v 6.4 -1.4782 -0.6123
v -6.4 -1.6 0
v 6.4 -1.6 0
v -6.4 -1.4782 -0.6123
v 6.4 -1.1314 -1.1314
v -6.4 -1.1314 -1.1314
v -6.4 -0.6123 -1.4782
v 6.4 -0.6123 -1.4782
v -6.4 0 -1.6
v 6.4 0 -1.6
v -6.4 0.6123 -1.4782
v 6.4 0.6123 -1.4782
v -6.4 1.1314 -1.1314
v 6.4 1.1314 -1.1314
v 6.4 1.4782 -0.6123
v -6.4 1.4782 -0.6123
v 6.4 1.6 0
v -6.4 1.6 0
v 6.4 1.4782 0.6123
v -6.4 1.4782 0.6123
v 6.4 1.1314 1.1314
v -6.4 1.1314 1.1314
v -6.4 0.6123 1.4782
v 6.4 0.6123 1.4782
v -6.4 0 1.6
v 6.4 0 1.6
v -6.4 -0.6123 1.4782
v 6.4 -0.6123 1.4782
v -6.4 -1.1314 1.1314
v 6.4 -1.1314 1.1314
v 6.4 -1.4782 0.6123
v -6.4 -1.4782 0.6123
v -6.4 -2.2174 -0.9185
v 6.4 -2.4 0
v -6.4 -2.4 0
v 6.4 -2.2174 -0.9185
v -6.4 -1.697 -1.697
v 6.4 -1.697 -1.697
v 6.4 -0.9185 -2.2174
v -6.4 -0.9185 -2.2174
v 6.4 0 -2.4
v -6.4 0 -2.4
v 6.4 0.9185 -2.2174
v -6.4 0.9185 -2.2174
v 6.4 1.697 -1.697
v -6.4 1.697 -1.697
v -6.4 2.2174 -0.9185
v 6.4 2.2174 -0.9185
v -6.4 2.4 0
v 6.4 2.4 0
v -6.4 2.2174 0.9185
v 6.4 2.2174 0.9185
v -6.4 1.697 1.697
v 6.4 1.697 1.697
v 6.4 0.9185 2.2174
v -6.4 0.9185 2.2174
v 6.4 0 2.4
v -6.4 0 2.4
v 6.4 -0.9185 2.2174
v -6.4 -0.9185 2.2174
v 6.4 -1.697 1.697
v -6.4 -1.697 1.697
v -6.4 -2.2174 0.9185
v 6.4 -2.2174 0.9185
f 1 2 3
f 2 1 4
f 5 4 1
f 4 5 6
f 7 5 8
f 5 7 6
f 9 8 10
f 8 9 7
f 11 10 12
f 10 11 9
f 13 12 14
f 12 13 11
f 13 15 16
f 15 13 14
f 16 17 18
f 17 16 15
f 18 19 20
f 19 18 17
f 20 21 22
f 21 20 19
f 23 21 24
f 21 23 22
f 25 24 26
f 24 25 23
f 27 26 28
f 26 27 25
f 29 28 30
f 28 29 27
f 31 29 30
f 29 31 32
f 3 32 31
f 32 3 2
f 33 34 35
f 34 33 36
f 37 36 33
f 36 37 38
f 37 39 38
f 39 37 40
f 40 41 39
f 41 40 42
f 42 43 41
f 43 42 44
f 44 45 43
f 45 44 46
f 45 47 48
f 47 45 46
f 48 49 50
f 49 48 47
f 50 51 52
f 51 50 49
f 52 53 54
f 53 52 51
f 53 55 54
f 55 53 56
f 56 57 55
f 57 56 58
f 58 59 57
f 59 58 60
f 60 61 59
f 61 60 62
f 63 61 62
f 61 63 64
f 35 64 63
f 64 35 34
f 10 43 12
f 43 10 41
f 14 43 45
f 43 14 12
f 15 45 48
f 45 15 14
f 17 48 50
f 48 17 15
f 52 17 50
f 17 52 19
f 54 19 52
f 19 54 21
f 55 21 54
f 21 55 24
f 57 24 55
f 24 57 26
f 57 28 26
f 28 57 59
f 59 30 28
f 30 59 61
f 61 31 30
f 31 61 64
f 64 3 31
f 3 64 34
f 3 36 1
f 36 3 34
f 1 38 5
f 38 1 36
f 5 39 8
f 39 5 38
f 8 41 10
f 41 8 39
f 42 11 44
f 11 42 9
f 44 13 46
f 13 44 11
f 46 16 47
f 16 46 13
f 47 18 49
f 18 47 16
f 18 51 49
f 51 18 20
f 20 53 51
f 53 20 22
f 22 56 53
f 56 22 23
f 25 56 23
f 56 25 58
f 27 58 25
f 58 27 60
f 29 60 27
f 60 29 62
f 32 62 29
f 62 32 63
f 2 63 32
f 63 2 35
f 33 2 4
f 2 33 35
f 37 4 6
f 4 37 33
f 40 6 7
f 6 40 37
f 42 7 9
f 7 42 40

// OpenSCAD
// file: ../p/4-4ring2.scad
use <../lib.scad>
function ldraw_lib__4_4ring2() = [
// 0 Ring  2 x 1.0
// 0 Name: 4-4ring2.dat
// 0 Author: James Jessiman
// 0 !LDRAW_ORG Primitive UPDATE 2009-01
// 0 !LICENSE Licensed under CC BY 2.0 and CC BY 4.0 : see CAreadme.txt
// 
// 0 BFC CERTIFY CCW
  [0,"BFC","CERTIFY"],
  [0,"BFC","CCW"],
// 
// 0 !HISTORY 1998-12-15 [PTadmin] Official Update 1998-10
// 0 !HISTORY 2002-04-05 [hafhead] Added BFC statement
// 0 !HISTORY 2002-04-25 [PTadmin] Official Update 2002-02
// 0 !HISTORY 2007-06-24 [PTadmin] Header formatted for Contributor Agreement
// 0 !HISTORY 2008-07-01 [PTadmin] Official Update 2008-01
// 0 !HISTORY 2008-08-26 [cwdee] Switch polygon winding and rename
// 0 !HISTORY 2009-05-02 [PTadmin] Official Update 2009-01
// 
// 
// 4 16 -1.1481 0 2.7717 -0.7654 0 1.8478 0 0 2 0 0 3
  [4,16,-1.1481,0,2.7717,-0.7654,0,1.8478,0,0,2,0,0,3],
// 4 16 -2.1213 0 2.1213 -1.4142 0 1.4142 -0.7654 0 1.8478 -1.1481 0 2.7717
  [4,16,-2.1213,0,2.1213,-1.4142,0,1.4142,-0.7654,0,1.8478,-1.1481,0,2.7717],
// 4 16 -2.7717 0 1.1481 -1.8478 0 0.7654 -1.4142 0 1.4142 -2.1213 0 2.1213
  [4,16,-2.7717,0,1.1481,-1.8478,0,0.7654,-1.4142,0,1.4142,-2.1213,0,2.1213],
// 4 16 -3 0 0 -2 0 0 -1.8478 0 0.7654 -2.7717 0 1.1481
  [4,16,-3,0,0,-2,0,0,-1.8478,0,0.7654,-2.7717,0,1.1481],
// 4 16 -2.7717 0 -1.1481 -1.8478 0 -0.7654 -2 0 0 -3 0 0
  [4,16,-2.7717,0,-1.1481,-1.8478,0,-0.7654,-2,0,0,-3,0,0],
// 4 16 -2.1213 0 -2.1213 -1.4142 0 -1.4142 -1.8478 0 -0.7654 -2.7717 0 -1.1481
  [4,16,-2.1213,0,-2.1213,-1.4142,0,-1.4142,-1.8478,0,-0.7654,-2.7717,0,-1.1481],
// 4 16 -1.1481 0 -2.7717 -0.7654 0 -1.8478 -1.4142 0 -1.4142 -2.1213 0 -2.1213
  [4,16,-1.1481,0,-2.7717,-0.7654,0,-1.8478,-1.4142,0,-1.4142,-2.1213,0,-2.1213],
// 4 16 0 0 -3 0 0 -2 -0.7654 0 -1.8478 -1.1481 0 -2.7717
  [4,16,0,0,-3,0,0,-2,-0.7654,0,-1.8478,-1.1481,0,-2.7717],
// 4 16 1.1481 0 -2.7717 0.7654 0 -1.8478 0 0 -2 0 0 -3
  [4,16,1.1481,0,-2.7717,0.7654,0,-1.8478,0,0,-2,0,0,-3],
// 4 16 2.1213 0 -2.1213 1.4142 0 -1.4142 0.7654 0 -1.8478 1.1481 0 -2.7717
  [4,16,2.1213,0,-2.1213,1.4142,0,-1.4142,0.7654,0,-1.8478,1.1481,0,-2.7717],
// 4 16 2.7717 0 -1.1481 1.8478 0 -0.7654 1.4142 0 -1.4142 2.1213 0 -2.1213
  [4,16,2.7717,0,-1.1481,1.8478,0,-0.7654,1.4142,0,-1.4142,2.1213,0,-2.1213],
// 4 16 3 0 0 2 0 0 1.8478 0 -0.7654 2.7717 0 -1.1481
  [4,16,3,0,0,2,0,0,1.8478,0,-0.7654,2.7717,0,-1.1481],
// 4 16 2.7717 0 1.1481 1.8478 0 0.7654 2 0 0 3 0 0
  [4,16,2.7717,0,1.1481,1.8478,0,0.7654,2,0,0,3,0,0],
// 4 16 2.1213 0 2.1213 1.4142 0 1.4142 1.8478 0 0.7654 2.7717 0 1.1481
  [4,16,2.1213,0,2.1213,1.4142,0,1.4142,1.8478,0,0.7654,2.7717,0,1.1481],
// 4 16 1.1481 0 2.7717 0.7654 0 1.8478 1.4142 0 1.4142 2.1213 0 2.1213
  [4,16,1.1481,0,2.7717,0.7654,0,1.8478,1.4142,0,1.4142,2.1213,0,2.1213],
// 4 16 0 0 3 0 0 2 0.7654 0 1.8478 1.1481 0 2.7717
  [4,16,0,0,3,0,0,2,0.7654,0,1.8478,1.1481,0,2.7717],
// 0
];
makepoly(ldraw_lib__4_4ring2(), line=0.2);
// file: ../p/4-4edge.scad
use <../lib.scad>
function ldraw_lib__4_4edge() = [
// 0 Circle 1.0
// 0 Name: 4-4edge.dat
// 0 Author: James Jessiman
// 0 !LDRAW_ORG Primitive UPDATE 2017-01
// 0 !LICENSE Licensed under CC BY 2.0 and CC BY 4.0 : see CAreadme.txt
// 
// 0 BFC CERTIFY CCW
  [0,"BFC","CERTIFY"],
  [0,"BFC","CCW"],
// 
// 0 !HISTORY 1998-12-15 [PTadmin] Official Update 1998-10
// 0 !HISTORY 2005-12-28 [PTadmin] Official Update 2005-01
// 0 !HISTORY 2007-06-24 [PTadmin] Header formatted for Contributor Agreement
// 0 !HISTORY 2008-07-01 [PTadmin] Official Update 2008-01
// 0 !HISTORY 2017-01-15 [Steffen] BFCed
// 0 !HISTORY 2017-12-30 [PTadmin] Official Update 2017-01
// 
// 
// 2 24 1 0 0 0.9239 0 0.3827
  [2,24,1,0,0,0.9239,0,0.3827],
// 2 24 0.9239 0 0.3827 0.7071 0 0.7071
  [2,24,0.9239,0,0.3827,0.7071,0,0.7071],
// 2 24 0.7071 0 0.7071 0.3827 0 0.9239
  [2,24,0.7071,0,0.7071,0.3827,0,0.9239],
// 2 24 0.3827 0 0.9239 0 0 1
  [2,24,0.3827,0,0.9239,0,0,1],
// 2 24 0 0 1 -0.3827 0 0.9239
  [2,24,0,0,1,-0.3827,0,0.9239],
// 2 24 -0.3827 0 0.9239 -0.7071 0 0.7071
  [2,24,-0.3827,0,0.9239,-0.7071,0,0.7071],
// 2 24 -0.7071 0 0.7071 -0.9239 0 0.3827
  [2,24,-0.7071,0,0.7071,-0.9239,0,0.3827],
// 2 24 -0.9239 0 0.3827 -1 0 -0
  [2,24,-0.9239,0,0.3827,-1,0,-0],
// 2 24 -1 0 -0 -0.9239 0 -0.3827
  [2,24,-1,0,-0,-0.9239,0,-0.3827],
// 2 24 -0.9239 0 -0.3827 -0.7071 0 -0.7071
  [2,24,-0.9239,0,-0.3827,-0.7071,0,-0.7071],
// 2 24 -0.7071 0 -0.7071 -0.3827 0 -0.9239
  [2,24,-0.7071,0,-0.7071,-0.3827,0,-0.9239],
// 2 24 -0.3827 0 -0.9239 0 0 -1
  [2,24,-0.3827,0,-0.9239,0,0,-1],
// 2 24 0 0 -1 0.3827 0 -0.9239
  [2,24,0,0,-1,0.3827,0,-0.9239],
// 2 24 0.3827 0 -0.9239 0.7071 0 -0.7071
  [2,24,0.3827,0,-0.9239,0.7071,0,-0.7071],
// 2 24 0.7071 0 -0.7071 0.9239 0 -0.3827
  [2,24,0.7071,0,-0.7071,0.9239,0,-0.3827],
// 2 24 0.9239 0 -0.3827 1 0 0
  [2,24,0.9239,0,-0.3827,1,0,0],
];
makepoly(ldraw_lib__4_4edge(), line=0.2);
// file: ../p/4-4cyli.scad
use <../lib.scad>
function ldraw_lib__4_4cyli() = [
// 0 Cylinder 1.0
// 0 Name: 4-4cyli.dat
// 0 Author: James Jessiman
// 0 !LDRAW_ORG Primitive UPDATE 2005-01
// 0 !LICENSE Licensed under CC BY 2.0 and CC BY 4.0 : see CAreadme.txt
// 
// 0 BFC CERTIFY CCW
  [0,"BFC","CERTIFY"],
  [0,"BFC","CCW"],
// 
// 0 !HISTORY 1998-12-15 [PTadmin] Official Update 1998-10
// 0 !HISTORY 2002-03-23 [sbliss] Added BFC statement; merged headers from files in distributions LDraw 0.27 and Complete.
// 0 !HISTORY 2002-04-25 [PTadmin] Official Update 2002-02
// 0 !HISTORY 2004-12-14 [guyvivan] BFC CCW
// 0 !HISTORY 2005-12-28 [PTadmin] Official Update 2005-01
// 0 !HISTORY 2007-06-24 [PTadmin] Header formatted for Contributor Agreement
// 0 !HISTORY 2008-07-01 [PTadmin] Official Update 2008-01
// 
// 
// 4 16 1 1 0 0.9239 1 0.3827 0.9239 0 0.3827 1 0 0
  [4,16,1,1,0,0.9239,1,0.3827,0.9239,0,0.3827,1,0,0],
// 5 24 1 0 0 1 1 0 0.9239 0 0.3827 0.9239 0 -0.3827
  [5,24,1,0,0,1,1,0,0.9239,0,0.3827,0.9239,0,-0.3827],
// 4 16 0.9239 1 0.3827 0.7071 1 0.7071 0.7071 0 0.7071 0.9239 0 0.3827
  [4,16,0.9239,1,0.3827,0.7071,1,0.7071,0.7071,0,0.7071,0.9239,0,0.3827],
// 5 24 0.9239 0 0.3827 0.9239 1 0.3827 0.7071 0 0.7071 1 0 0
  [5,24,0.9239,0,0.3827,0.9239,1,0.3827,0.7071,0,0.7071,1,0,0],
// 4 16 0.7071 1 0.7071 0.3827 1 0.9239 0.3827 0 0.9239 0.7071 0 0.7071
  [4,16,0.7071,1,0.7071,0.3827,1,0.9239,0.3827,0,0.9239,0.7071,0,0.7071],
// 5 24 0.7071 0 0.7071 0.7071 1 0.7071 0.3827 0 0.9239 0.9239 0 0.3827
  [5,24,0.7071,0,0.7071,0.7071,1,0.7071,0.3827,0,0.9239,0.9239,0,0.3827],
// 4 16 0.3827 1 0.9239 0 1 1 0 0 1 0.3827 0 0.9239
  [4,16,0.3827,1,0.9239,0,1,1,0,0,1,0.3827,0,0.9239],
// 5 24 0.3827 0 0.9239 0.3827 1 0.9239 0 0 1 0.7071 0 0.7071
  [5,24,0.3827,0,0.9239,0.3827,1,0.9239,0,0,1,0.7071,0,0.7071],
// 4 16 0 1 1 -0.3827 1 0.9239 -0.3827 0 0.9239 0 0 1
  [4,16,0,1,1,-0.3827,1,0.9239,-0.3827,0,0.9239,0,0,1],
// 5 24 0 0 1 0 1 1 -0.3827 0 0.9239 0.3827 0 0.9239
  [5,24,0,0,1,0,1,1,-0.3827,0,0.9239,0.3827,0,0.9239],
// 4 16 -0.3827 1 0.9239 -0.7071 1 0.7071 -0.7071 0 0.7071 -0.3827 0 0.9239
  [4,16,-0.3827,1,0.9239,-0.7071,1,0.7071,-0.7071,0,0.7071,-0.3827,0,0.9239],
// 5 24 -0.3827 0 0.9239 -0.3827 1 0.9239 -0.7071 0 0.7071 0 0 1
  [5,24,-0.3827,0,0.9239,-0.3827,1,0.9239,-0.7071,0,0.7071,0,0,1],
// 4 16 -0.7071 1 0.7071 -0.9239 1 0.3827 -0.9239 0 0.3827 -0.7071 0 0.7071
  [4,16,-0.7071,1,0.7071,-0.9239,1,0.3827,-0.9239,0,0.3827,-0.7071,0,0.7071],
// 5 24 -0.7071 0 0.7071 -0.7071 1 0.7071 -0.9239 0 0.3827 -0.3827 0 0.9239
  [5,24,-0.7071,0,0.7071,-0.7071,1,0.7071,-0.9239,0,0.3827,-0.3827,0,0.9239],
// 4 16 -0.9239 1 0.3827 -1 1 0 -1 0 0 -0.9239 0 0.3827
  [4,16,-0.9239,1,0.3827,-1,1,0,-1,0,0,-0.9239,0,0.3827],
// 5 24 -0.9239 0 0.3827 -0.9239 1 0.3827 -1 0 0 -0.7071 0 0.7071
  [5,24,-0.9239,0,0.3827,-0.9239,1,0.3827,-1,0,0,-0.7071,0,0.7071],
// 4 16 -1 1 0 -0.9239 1 -0.3827 -0.9239 0 -0.3827 -1 0 0
  [4,16,-1,1,0,-0.9239,1,-0.3827,-0.9239,0,-0.3827,-1,0,0],
// 5 24 -1 0 0 -1 1 0 -0.9239 0 -0.3827 -0.9239 0 0.3827
  [5,24,-1,0,0,-1,1,0,-0.9239,0,-0.3827,-0.9239,0,0.3827],
// 4 16 -0.9239 1 -0.3827 -0.7071 1 -0.7071 -0.7071 0 -0.7071 -0.9239 0 -0.3827
  [4,16,-0.9239,1,-0.3827,-0.7071,1,-0.7071,-0.7071,0,-0.7071,-0.9239,0,-0.3827],
// 5 24 -0.9239 0 -0.3827 -0.9239 1 -0.3827 -0.7071 0 -0.7071 -1 0 0
  [5,24,-0.9239,0,-0.3827,-0.9239,1,-0.3827,-0.7071,0,-0.7071,-1,0,0],
// 4 16 -0.7071 1 -0.7071 -0.3827 1 -0.9239 -0.3827 0 -0.9239 -0.7071 0 -0.7071
  [4,16,-0.7071,1,-0.7071,-0.3827,1,-0.9239,-0.3827,0,-0.9239,-0.7071,0,-0.7071],
// 5 24 -0.7071 0 -0.7071 -0.7071 1 -0.7071 -0.3827 0 -0.9239 -0.9239 0 -0.3827
  [5,24,-0.7071,0,-0.7071,-0.7071,1,-0.7071,-0.3827,0,-0.9239,-0.9239,0,-0.3827],
// 4 16 -0.3827 1 -0.9239 0 1 -1 0 0 -1 -0.3827 0 -0.9239
  [4,16,-0.3827,1,-0.9239,0,1,-1,0,0,-1,-0.3827,0,-0.9239],
// 5 24 -0.3827 0 -0.9239 -0.3827 1 -0.9239 0 0 -1 -0.7071 0 -0.7071
  [5,24,-0.3827,0,-0.9239,-0.3827,1,-0.9239,0,0,-1,-0.7071,0,-0.7071],
// 4 16 0 1 -1 0.3827 1 -0.9239 0.3827 0 -0.9239 0 0 -1
  [4,16,0,1,-1,0.3827,1,-0.9239,0.3827,0,-0.9239,0,0,-1],
// 5 24 0 0 -1 0 1 -1 0.3827 0 -0.9239 -0.3827 0 -0.9239
  [5,24,0,0,-1,0,1,-1,0.3827,0,-0.9239,-0.3827,0,-0.9239],
// 4 16 0.3827 1 -0.9239 0.7071 1 -0.7071 0.7071 0 -0.7071 0.3827 0 -0.9239
  [4,16,0.3827,1,-0.9239,0.7071,1,-0.7071,0.7071,0,-0.7071,0.3827,0,-0.9239],
// 5 24 0.3827 0 -0.9239 0.3827 1 -0.9239 0.7071 0 -0.7071 0 0 -1
  [5,24,0.3827,0,-0.9239,0.3827,1,-0.9239,0.7071,0,-0.7071,0,0,-1],
// 4 16 0.7071 1 -0.7071 0.9239 1 -0.3827 0.9239 0 -0.3827 0.7071 0 -0.7071
  [4,16,0.7071,1,-0.7071,0.9239,1,-0.3827,0.9239,0,-0.3827,0.7071,0,-0.7071],
// 5 24 0.7071 0 -0.7071 0.7071 1 -0.7071 0.9239 0 -0.3827 0.3827 0 -0.9239
  [5,24,0.7071,0,-0.7071,0.7071,1,-0.7071,0.9239,0,-0.3827,0.3827,0,-0.9239],
// 4 16 0.9239 1 -0.3827 1 1 0 1 0 0 0.9239 0 -0.3827
  [4,16,0.9239,1,-0.3827,1,1,0,1,0,0,0.9239,0,-0.3827],
// 5 24 0.9239 0 -0.3827 0.9239 1 -0.3827 1 0 0 0.7071 0 -0.7071
  [5,24,0.9239,0,-0.3827,0.9239,1,-0.3827,1,0,0,0.7071,0,-0.7071],
// 0
];
makepoly(ldraw_lib__4_4cyli(), line=0.2);
// file: 3112.scad
use <../lib.scad>
use <../p/4-4cyli.scad>
use <../p/4-4edge.scad>
use <../p/4-4ring2.scad>
function ldraw_lib__3112() = [
// 0 ~Axle Bush 1.6L
// 0 Name: 3112.dat
// 0 Author: James Jessiman
// 0 !LDRAW_ORG Part UPDATE 2018-02
// 0 !LICENSE Licensed under CC BY 2.0 and CC BY 4.0 : see CAreadme.txt
// 
// 0 BFC CERTIFY CW
  [0,"BFC","CERTIFY"],
  [0,"BFC","CW"],
// 
// 0 !CATEGORY Wheel
// 
// 0 !HISTORY 2007-06-25 [PTadmin] Header formatted for Contributor Agreement
// 0 !HISTORY 2008-07-01 [PTadmin] Official Update 2008-01
// 0 !HISTORY 2008-07-07 [mkennedy] Completed header, BFC'ed, Optimized
// 0 !HISTORY 2008-08-23 [PTadmin] Renamed from 34c
// 0 !HISTORY 2009-05-02 [PTadmin] Official Update 2009-01
// 0 !HISTORY 2018-11-24 [cwdee] Update description
// 0 !HISTORY 2018-12-08 [PTadmin] Official Update 2018-02
// 
// 
// 0 BFC INVERTNEXT
  [0,"BFC","INVERTNEXT"],
// 1 16 0 0 -16 4 0 0 0 0 4 0 32 0 4-4cyli.dat
  [1,16,0,0,-16,4,0,0,0,0,4,0,32,0, ldraw_lib__4_4cyli()],
// 1 16 0 0 -16 6 0 0 0 0 6 0 32 0 4-4cyli.dat
  [1,16,0,0,-16,6,0,0,0,0,6,0,32,0, ldraw_lib__4_4cyli()],
// 1 16 0 0 -16 4 0 0 0 0 4 0 1 0 4-4edge.dat
  [1,16,0,0,-16,4,0,0,0,0,4,0,1,0, ldraw_lib__4_4edge()],
// 1 16 0 0 16 4 0 0 0 0 4 0 1 0 4-4edge.dat
  [1,16,0,0,16,4,0,0,0,0,4,0,1,0, ldraw_lib__4_4edge()],
// 1 16 0 0 -16 6 0 0 0 0 6 0 1 0 4-4edge.dat
  [1,16,0,0,-16,6,0,0,0,0,6,0,1,0, ldraw_lib__4_4edge()],
// 1 16 0 0 16 6 0 0 0 0 6 0 1 0 4-4edge.dat
  [1,16,0,0,16,6,0,0,0,0,6,0,1,0, ldraw_lib__4_4edge()],
// 1 16 0 0 16 2 0 0 0 0 2 0 -1 0 4-4ring2.dat
  [1,16,0,0,16,2,0,0,0,0,2,0,-1,0, ldraw_lib__4_4ring2()],
// 1 16 0 0 -16 2 0 0 0 0 2 0 1 0 4-4ring2.dat
  [1,16,0,0,-16,2,0,0,0,0,2,0,1,0, ldraw_lib__4_4ring2()],
// 0
// 
];
makepoly(ldraw_lib__3112(), line=0.2);
// main file
use <../lib.scad>
use <3112.scad>
function ldraw_lib__313() = [
// 0 ~Hinge Plate  2 x  5 Pivot
// 0 Name: 313.dat
// 0 Author: James Jessiman
// 0 !LDRAW_ORG Part UPDATE 2009-03
// 0 !LICENSE Licensed under CC BY 2.0 and CC BY 4.0 : see CAreadme.txt
// 
// 0 BFC CERTIFY CCW
  [0,"BFC","CERTIFY"],
  [0,"BFC","CCW"],
// 
// 0 !HISTORY 1999-05-17 [PTadmin] Official Update 1999-03
// 0 !HISTORY 2007-10-26 [PTadmin] Header formatted for Contributor Agreement
// 0 !HISTORY 2008-07-01 [PTadmin] Official Update 2008-01
// 0 !HISTORY 2008-07-07 [guyvivan] Made BFC Compliant (2004-11-16)
// 0 !HISTORY 2008-07-08 [guyvivan] Replace stud2a by primitives (2006-07-26)
// 0 !HISTORY 2009-08-24 [cwdee] Change to reference to 3112 as this is the same part used in different ways
// 0 !HISTORY 2009-12-29 [PTadmin] Official Update 2009-03
// 
// 
// 1 16 0 0 0 0 0 1 0 1 0 -1 0 0 3112.dat
  [1,16,0,0,0,0,0,1,0,1,0,-1,0,0, ldraw_lib__3112()],
// 0
];
makepoly(ldraw_lib__313(), line=0.2);
